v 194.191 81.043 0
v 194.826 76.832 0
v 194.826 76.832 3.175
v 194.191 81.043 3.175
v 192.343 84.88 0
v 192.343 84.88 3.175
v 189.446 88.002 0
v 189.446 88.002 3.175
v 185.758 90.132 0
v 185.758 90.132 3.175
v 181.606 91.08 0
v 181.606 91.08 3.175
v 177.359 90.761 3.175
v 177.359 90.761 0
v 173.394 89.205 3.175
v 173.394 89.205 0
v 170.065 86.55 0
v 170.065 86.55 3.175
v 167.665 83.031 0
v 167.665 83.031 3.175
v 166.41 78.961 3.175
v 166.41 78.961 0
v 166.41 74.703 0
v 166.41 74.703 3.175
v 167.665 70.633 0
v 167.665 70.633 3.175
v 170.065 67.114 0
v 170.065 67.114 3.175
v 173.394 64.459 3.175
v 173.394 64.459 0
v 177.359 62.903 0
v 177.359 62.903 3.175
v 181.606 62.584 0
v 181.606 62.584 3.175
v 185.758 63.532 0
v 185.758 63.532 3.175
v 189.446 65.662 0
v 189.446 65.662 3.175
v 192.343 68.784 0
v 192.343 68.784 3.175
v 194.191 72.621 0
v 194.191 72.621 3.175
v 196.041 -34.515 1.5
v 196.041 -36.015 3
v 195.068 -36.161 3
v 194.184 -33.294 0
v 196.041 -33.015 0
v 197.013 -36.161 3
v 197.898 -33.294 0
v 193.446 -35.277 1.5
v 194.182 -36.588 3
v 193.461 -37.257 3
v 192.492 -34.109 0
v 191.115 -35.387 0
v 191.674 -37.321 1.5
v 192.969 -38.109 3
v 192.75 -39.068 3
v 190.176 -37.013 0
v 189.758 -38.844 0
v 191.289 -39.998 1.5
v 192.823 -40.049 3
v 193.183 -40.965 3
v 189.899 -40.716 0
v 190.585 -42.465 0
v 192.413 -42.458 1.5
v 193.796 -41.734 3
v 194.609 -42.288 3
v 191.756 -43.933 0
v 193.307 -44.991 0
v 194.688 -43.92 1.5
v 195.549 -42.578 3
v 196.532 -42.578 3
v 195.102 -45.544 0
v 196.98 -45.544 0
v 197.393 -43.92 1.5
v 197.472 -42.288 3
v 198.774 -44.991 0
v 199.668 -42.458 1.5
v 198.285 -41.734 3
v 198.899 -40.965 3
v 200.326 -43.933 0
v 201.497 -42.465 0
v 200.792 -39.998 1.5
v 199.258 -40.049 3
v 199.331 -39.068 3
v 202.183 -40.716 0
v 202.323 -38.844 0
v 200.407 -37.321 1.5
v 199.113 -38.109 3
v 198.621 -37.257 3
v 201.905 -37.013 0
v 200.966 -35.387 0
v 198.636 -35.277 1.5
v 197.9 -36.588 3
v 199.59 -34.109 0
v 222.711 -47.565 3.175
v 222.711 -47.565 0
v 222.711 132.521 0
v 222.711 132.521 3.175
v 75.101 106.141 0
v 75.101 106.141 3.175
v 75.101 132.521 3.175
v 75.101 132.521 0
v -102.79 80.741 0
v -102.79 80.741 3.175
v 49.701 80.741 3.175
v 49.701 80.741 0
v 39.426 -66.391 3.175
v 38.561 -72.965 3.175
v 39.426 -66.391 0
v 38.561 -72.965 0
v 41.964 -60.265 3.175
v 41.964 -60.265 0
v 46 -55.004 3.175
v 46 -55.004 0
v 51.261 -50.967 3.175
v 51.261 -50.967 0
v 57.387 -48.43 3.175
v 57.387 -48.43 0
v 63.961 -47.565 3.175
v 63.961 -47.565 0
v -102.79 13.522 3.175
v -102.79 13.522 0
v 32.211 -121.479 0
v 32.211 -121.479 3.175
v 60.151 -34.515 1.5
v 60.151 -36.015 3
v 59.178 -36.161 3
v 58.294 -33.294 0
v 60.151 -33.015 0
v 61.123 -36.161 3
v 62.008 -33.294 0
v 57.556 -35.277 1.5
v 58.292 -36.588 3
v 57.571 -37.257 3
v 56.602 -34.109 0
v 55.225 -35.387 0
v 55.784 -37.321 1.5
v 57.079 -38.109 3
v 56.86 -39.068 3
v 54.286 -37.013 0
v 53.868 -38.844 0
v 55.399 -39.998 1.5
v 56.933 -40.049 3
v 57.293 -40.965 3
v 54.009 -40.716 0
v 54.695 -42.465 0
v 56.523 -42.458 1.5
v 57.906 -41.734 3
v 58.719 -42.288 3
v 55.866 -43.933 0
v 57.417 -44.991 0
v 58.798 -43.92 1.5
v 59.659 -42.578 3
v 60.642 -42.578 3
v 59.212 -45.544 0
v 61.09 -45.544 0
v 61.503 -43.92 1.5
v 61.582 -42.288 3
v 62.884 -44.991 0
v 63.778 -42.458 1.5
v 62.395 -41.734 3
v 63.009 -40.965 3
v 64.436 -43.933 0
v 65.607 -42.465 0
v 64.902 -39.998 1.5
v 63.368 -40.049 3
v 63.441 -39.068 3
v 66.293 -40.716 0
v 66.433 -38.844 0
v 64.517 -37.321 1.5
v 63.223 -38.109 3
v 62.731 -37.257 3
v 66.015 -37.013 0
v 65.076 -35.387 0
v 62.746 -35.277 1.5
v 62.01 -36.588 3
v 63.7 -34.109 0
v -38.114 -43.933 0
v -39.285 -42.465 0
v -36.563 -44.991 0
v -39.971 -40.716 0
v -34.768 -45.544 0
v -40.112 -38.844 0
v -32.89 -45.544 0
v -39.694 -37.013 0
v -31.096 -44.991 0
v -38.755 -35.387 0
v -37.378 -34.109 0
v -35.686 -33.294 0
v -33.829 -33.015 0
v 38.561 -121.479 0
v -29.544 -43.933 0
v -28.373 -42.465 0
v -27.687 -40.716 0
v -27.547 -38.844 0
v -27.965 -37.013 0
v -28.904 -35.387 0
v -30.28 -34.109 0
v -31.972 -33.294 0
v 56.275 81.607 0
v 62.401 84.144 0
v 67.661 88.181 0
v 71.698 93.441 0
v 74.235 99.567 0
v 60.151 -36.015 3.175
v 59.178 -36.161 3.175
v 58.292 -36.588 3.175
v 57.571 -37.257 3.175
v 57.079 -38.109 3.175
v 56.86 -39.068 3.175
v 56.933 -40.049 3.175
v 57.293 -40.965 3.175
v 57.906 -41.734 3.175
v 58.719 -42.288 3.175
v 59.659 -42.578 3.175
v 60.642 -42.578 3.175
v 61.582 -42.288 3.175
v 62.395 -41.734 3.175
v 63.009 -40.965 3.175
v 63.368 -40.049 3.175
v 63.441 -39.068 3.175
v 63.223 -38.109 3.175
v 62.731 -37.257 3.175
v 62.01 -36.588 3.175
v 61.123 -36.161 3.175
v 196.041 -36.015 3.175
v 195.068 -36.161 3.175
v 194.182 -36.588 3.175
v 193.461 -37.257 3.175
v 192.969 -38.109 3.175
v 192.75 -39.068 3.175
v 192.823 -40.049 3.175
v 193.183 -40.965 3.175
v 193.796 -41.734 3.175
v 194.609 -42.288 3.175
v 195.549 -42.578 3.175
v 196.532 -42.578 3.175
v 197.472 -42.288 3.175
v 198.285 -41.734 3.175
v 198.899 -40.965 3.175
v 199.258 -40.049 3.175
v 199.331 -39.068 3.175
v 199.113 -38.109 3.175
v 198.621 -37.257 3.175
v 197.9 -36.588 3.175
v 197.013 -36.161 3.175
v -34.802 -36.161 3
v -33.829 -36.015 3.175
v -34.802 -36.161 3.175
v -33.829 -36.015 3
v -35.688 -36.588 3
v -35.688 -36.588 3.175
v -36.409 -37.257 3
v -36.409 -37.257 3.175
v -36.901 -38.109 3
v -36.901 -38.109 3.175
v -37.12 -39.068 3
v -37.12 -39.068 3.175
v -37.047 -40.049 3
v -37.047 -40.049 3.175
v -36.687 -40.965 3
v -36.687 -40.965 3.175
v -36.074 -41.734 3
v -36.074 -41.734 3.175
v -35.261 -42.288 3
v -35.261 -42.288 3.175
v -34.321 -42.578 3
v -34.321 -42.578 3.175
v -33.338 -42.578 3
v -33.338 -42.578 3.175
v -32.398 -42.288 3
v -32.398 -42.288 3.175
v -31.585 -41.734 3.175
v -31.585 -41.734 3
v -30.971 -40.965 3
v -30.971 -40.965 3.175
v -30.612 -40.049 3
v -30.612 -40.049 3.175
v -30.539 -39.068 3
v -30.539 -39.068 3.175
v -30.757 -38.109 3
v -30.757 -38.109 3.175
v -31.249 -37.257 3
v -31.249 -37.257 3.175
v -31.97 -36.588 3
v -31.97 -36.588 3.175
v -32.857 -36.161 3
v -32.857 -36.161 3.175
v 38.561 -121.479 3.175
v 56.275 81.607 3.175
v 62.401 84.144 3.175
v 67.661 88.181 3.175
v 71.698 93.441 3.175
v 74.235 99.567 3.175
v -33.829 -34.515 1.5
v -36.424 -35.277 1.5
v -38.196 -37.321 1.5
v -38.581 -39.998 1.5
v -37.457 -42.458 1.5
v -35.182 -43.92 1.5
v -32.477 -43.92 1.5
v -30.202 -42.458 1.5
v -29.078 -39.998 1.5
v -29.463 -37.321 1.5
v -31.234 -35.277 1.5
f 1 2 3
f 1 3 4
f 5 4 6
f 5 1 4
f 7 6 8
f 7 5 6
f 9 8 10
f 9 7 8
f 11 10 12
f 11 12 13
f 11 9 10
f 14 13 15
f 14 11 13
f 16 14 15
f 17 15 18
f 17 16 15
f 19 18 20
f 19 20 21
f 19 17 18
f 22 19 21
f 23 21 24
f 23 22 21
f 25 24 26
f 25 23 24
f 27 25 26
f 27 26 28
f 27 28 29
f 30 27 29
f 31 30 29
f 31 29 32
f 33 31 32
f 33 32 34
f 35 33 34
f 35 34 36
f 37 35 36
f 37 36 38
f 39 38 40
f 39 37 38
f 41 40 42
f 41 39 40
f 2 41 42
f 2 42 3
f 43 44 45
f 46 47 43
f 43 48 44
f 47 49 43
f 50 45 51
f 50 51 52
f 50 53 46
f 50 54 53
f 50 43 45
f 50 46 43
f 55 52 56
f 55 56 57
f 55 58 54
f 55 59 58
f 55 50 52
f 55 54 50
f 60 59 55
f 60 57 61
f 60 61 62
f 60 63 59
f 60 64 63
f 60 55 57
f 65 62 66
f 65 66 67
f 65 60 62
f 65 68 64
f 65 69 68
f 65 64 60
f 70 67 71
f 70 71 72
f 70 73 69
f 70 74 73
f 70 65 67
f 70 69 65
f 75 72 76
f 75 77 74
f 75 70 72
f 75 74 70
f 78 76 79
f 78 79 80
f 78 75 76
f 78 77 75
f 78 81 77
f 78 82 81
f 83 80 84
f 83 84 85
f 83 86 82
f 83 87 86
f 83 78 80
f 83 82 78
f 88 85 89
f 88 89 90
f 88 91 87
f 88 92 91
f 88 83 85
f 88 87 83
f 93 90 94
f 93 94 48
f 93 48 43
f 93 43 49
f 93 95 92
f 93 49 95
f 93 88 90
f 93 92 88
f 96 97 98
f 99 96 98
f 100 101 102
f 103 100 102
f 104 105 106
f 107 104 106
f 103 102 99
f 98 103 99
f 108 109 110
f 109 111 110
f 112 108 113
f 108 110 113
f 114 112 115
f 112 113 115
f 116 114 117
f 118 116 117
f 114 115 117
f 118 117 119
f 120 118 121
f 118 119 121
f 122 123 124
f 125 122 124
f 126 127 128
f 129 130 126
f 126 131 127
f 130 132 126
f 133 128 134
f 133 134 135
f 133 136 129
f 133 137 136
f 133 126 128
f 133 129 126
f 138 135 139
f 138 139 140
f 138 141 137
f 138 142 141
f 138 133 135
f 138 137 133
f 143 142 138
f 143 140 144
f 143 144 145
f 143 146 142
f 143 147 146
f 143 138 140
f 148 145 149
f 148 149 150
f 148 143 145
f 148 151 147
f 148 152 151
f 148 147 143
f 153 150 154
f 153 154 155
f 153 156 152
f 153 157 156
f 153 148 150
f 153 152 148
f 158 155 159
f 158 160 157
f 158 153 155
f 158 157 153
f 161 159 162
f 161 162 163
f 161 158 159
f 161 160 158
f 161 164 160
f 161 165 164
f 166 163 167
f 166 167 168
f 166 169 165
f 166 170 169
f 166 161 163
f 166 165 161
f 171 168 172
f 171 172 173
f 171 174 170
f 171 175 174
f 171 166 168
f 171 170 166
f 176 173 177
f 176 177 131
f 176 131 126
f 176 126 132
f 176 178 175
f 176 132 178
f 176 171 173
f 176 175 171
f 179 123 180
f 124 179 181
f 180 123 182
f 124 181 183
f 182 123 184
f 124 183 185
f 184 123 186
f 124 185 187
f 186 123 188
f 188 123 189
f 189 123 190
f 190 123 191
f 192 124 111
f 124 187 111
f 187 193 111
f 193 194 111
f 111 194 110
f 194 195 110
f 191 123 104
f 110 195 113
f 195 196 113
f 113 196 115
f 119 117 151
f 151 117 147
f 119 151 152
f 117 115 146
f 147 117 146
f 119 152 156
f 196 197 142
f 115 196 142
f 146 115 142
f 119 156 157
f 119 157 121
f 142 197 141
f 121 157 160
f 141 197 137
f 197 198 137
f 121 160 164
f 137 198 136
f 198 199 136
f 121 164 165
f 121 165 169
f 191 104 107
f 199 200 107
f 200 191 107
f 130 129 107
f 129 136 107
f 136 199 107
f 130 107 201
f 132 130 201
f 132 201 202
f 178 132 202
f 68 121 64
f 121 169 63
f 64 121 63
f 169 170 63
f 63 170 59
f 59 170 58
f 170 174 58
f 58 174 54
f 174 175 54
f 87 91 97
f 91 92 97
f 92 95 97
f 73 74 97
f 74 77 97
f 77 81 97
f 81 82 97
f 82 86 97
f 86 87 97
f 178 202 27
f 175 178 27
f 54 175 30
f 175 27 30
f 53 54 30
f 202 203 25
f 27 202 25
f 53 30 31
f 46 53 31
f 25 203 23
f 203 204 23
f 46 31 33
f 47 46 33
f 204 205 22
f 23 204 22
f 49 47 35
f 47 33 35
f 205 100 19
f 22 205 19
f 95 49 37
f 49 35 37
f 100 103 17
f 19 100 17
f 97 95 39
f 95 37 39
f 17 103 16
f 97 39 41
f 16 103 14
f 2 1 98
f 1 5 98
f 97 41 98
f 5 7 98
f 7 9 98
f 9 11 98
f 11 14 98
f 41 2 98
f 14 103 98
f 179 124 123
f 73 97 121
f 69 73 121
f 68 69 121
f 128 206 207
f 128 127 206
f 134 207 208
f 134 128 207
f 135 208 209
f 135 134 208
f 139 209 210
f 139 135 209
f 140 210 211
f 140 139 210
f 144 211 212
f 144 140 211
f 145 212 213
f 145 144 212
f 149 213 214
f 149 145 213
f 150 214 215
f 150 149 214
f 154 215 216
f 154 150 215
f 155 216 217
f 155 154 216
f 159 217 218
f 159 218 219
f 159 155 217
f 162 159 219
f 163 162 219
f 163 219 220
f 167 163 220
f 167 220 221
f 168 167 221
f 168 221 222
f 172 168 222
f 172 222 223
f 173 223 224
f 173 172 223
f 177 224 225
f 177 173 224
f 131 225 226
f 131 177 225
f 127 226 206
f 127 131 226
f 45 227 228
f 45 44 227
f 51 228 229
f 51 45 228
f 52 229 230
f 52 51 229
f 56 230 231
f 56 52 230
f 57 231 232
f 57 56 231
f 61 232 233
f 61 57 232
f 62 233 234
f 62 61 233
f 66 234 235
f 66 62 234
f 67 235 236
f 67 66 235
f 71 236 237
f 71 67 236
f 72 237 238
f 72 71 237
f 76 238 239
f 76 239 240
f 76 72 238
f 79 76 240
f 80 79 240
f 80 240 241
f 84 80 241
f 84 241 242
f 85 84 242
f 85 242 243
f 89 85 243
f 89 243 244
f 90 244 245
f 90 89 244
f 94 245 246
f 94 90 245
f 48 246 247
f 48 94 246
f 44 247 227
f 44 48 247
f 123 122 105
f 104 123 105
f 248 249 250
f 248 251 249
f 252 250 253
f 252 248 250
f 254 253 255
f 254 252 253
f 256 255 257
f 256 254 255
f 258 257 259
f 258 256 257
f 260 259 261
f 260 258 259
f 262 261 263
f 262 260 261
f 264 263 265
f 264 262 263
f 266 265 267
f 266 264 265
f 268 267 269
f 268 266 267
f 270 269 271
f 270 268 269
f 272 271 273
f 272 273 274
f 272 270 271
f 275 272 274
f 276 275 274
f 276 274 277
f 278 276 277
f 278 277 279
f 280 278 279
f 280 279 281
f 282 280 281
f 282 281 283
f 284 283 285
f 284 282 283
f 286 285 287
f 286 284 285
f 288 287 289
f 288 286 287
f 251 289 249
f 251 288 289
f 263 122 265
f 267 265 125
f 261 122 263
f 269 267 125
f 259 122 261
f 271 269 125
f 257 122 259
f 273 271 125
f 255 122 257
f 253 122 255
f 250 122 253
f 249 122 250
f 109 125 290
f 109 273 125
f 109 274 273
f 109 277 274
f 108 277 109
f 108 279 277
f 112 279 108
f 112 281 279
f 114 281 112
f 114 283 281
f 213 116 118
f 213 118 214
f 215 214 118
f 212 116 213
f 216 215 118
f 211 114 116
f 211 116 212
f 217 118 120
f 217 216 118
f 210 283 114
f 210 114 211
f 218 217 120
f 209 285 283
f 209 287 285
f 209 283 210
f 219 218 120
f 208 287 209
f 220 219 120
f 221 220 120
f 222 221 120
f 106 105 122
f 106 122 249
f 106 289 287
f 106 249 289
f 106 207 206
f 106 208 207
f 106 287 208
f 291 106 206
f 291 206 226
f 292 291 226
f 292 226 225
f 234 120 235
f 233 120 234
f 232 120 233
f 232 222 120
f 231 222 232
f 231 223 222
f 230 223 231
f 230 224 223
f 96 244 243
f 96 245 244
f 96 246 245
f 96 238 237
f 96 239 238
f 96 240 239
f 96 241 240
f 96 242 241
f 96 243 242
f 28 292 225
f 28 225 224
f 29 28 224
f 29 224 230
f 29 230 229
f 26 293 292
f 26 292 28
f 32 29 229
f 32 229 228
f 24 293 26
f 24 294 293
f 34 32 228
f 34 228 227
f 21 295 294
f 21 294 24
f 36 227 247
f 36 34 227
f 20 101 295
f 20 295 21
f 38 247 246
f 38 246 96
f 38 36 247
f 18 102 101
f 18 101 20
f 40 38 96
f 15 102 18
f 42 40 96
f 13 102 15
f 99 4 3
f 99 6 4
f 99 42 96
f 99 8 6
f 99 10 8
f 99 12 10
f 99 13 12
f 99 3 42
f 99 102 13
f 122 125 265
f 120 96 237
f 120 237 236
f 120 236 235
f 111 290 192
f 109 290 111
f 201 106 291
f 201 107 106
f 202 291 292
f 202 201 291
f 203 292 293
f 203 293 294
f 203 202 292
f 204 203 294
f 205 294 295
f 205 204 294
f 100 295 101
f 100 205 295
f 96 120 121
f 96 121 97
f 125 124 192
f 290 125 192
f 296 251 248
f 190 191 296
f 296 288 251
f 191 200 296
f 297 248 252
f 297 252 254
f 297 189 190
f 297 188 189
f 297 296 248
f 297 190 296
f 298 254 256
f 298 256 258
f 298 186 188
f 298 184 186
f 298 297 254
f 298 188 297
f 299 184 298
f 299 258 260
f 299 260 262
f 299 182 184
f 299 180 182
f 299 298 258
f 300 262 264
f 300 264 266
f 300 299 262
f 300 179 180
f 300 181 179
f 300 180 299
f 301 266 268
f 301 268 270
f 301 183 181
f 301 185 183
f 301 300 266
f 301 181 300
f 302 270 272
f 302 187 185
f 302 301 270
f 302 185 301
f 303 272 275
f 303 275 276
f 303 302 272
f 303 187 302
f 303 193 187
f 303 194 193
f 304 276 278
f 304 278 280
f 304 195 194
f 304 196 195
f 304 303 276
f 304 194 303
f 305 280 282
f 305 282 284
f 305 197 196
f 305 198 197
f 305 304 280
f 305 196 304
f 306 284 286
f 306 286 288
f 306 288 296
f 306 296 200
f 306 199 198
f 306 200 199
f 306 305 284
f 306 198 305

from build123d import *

# Parameters (mm, degrees)
SKETCH1_R                                      = 14.2875
BOSS_EXTRUDE1_DEPTH                            = 3.175
SKETCH2_W                                      = 184.202806358
SKETCH2_H                                      = 73.914
CUT_EXTRUDE1_DEPTH                             = 4.175
FILLET1_R                                      = 25.4
SKETCH4_W                                      = 213.36
SKETCH4_H                                      = 64.479988722
CUT_EXTRUDE2_DEPTH                             = 4.175
FILLET2_R                                      = 25.4
SKETCH7_W                                      = 147.610011278
SKETCH7_H                                      = 12.7
CUT_EXTRUDE4_DEPTH                             = 4.175
CSK_FOR_M6_FLAT_HEAD_MACHINE_SCREW1_AT_2_COUNT = 2
CSK_FOR_M6_FLAT_HEAD_MACHINE_SCREW1_AT_2_PITCH = 135.89
CSK_FOR_M6_FLAT_HEAD_MACHINE_SCREW1_AT_3_COUNT = 2
CSK_FOR_M6_FLAT_HEAD_MACHINE_SCREW1_AT_3_PITCH = 229.87
SKETCH10_W                                     = 57.863879914
SKETCH10_H                                     = 74.228534035
CUT_EXTRUDE5_DEPTH                             = 4.175


with BuildPart() as part:
    # Sketch1 → Boss-Extrude1 (new body)
    with BuildSketch(Plane.XY):
        Polygon((-138.259383474, 48.991487021), (32.210627804, -121.478524257), (222.710627804, -121.478524257), (222.710627804, 145.221475743), (-138.259383474, 145.221475743), align=None)
        with Locations((180.538014078, 76.831975743)):
            Circle(SKETCH1_R, mode=Mode.SUBTRACT)
    extrude(amount=BOSS_EXTRUDE1_DEPTH)

    # Sketch2 → Cut-Extrude1 (cut, through all)
    with BuildSketch(Plane.XY.offset(3.175)):
        with Locations((130.662030983, -84.521524257)):
            Rectangle(SKETCH2_W, SKETCH2_H)
    extrude(amount=-CUT_EXTRUDE1_DEPTH, mode=Mode.SUBTRACT)

    # Fillet1
    fillet1_edges = [part.edges().sort_by_distance(p)[0] for p in [
        (38.560627804, -47.564524257, 1.5875),
    ]]
    fillet(fillet1_edges, radius=FILLET1_R)

    # Sketch4 → Cut-Extrude2 (cut, through all)
    with BuildSketch(Plane.XY.offset(3.175)):
        with Locations((-31.579383474, 112.981481382)):
            Rectangle(SKETCH4_W, SKETCH4_H)
    extrude(amount=-CUT_EXTRUDE2_DEPTH, mode=Mode.SUBTRACT)

    # Fillet2
    fillet2_edges = [part.edges().sort_by_distance(p)[0] for p in [
        (-138.259383474, 80.741487021, 1.5875),
        (75.100616526, 80.741487021, 1.5875),
    ]]
    fillet(fillet2_edges, radius=FILLET2_R)

    # Sketch7 → Cut-Extrude4 (cut, through all)
    with BuildSketch(Plane.XY.offset(3.175)):
        with Locations((148.905622165, 138.871475743)):
            Rectangle(SKETCH7_W, SKETCH7_H)
    extrude(amount=-CUT_EXTRUDE4_DEPTH, mode=Mode.SUBTRACT)

    # Sketch8 → CSK for M6 Flat Head Machine Screw1 (revolve, cut)
    with BuildSketch(Plane(origin=(196.040627804, -39.314524257, 0), x_dir=(0, 1, 0), z_dir=(1, 0, 0))):
        Polygon((0, 0), (0, 3.175), (3.3, 3.175), (3.3, 3), (6.3, 0), align=None)
    csk_for_m6_flat_head_machine_screw1 = revolve(axis=Axis((196.040627804, -39.314524257, -6.35), (0, 0, 1)), mode=Mode.SUBTRACT)

    # CSK for M6 Flat Head Machine Screw1 at 2: CSK for M6 Flat Head Machine Screw1 ×2
    with Locations(*[(-i * CSK_FOR_M6_FLAT_HEAD_MACHINE_SCREW1_AT_2_PITCH, 0, 0) for i in range(1, CSK_FOR_M6_FLAT_HEAD_MACHINE_SCREW1_AT_2_COUNT)]):
        add(csk_for_m6_flat_head_machine_screw1, mode=Mode.SUBTRACT)

    # CSK for M6 Flat Head Machine Screw1 at 3: CSK for M6 Flat Head Machine Screw1 ×2
    with Locations(*[(-i * CSK_FOR_M6_FLAT_HEAD_MACHINE_SCREW1_AT_3_PITCH, 0, 0) for i in range(1, CSK_FOR_M6_FLAT_HEAD_MACHINE_SCREW1_AT_3_COUNT)]):
        add(csk_for_m6_flat_head_machine_screw1, mode=Mode.SUBTRACT)

    # Sketch10 → Cut-Extrude5 (cut, through all)
    with BuildSketch(Plane.XY.offset(3.175)):
        with Locations((-131.722312153, 50.636742761)):
            Rectangle(SKETCH10_W, SKETCH10_H)
    extrude(amount=-CUT_EXTRUDE5_DEPTH, mode=Mode.SUBTRACT)


solid = part.part
